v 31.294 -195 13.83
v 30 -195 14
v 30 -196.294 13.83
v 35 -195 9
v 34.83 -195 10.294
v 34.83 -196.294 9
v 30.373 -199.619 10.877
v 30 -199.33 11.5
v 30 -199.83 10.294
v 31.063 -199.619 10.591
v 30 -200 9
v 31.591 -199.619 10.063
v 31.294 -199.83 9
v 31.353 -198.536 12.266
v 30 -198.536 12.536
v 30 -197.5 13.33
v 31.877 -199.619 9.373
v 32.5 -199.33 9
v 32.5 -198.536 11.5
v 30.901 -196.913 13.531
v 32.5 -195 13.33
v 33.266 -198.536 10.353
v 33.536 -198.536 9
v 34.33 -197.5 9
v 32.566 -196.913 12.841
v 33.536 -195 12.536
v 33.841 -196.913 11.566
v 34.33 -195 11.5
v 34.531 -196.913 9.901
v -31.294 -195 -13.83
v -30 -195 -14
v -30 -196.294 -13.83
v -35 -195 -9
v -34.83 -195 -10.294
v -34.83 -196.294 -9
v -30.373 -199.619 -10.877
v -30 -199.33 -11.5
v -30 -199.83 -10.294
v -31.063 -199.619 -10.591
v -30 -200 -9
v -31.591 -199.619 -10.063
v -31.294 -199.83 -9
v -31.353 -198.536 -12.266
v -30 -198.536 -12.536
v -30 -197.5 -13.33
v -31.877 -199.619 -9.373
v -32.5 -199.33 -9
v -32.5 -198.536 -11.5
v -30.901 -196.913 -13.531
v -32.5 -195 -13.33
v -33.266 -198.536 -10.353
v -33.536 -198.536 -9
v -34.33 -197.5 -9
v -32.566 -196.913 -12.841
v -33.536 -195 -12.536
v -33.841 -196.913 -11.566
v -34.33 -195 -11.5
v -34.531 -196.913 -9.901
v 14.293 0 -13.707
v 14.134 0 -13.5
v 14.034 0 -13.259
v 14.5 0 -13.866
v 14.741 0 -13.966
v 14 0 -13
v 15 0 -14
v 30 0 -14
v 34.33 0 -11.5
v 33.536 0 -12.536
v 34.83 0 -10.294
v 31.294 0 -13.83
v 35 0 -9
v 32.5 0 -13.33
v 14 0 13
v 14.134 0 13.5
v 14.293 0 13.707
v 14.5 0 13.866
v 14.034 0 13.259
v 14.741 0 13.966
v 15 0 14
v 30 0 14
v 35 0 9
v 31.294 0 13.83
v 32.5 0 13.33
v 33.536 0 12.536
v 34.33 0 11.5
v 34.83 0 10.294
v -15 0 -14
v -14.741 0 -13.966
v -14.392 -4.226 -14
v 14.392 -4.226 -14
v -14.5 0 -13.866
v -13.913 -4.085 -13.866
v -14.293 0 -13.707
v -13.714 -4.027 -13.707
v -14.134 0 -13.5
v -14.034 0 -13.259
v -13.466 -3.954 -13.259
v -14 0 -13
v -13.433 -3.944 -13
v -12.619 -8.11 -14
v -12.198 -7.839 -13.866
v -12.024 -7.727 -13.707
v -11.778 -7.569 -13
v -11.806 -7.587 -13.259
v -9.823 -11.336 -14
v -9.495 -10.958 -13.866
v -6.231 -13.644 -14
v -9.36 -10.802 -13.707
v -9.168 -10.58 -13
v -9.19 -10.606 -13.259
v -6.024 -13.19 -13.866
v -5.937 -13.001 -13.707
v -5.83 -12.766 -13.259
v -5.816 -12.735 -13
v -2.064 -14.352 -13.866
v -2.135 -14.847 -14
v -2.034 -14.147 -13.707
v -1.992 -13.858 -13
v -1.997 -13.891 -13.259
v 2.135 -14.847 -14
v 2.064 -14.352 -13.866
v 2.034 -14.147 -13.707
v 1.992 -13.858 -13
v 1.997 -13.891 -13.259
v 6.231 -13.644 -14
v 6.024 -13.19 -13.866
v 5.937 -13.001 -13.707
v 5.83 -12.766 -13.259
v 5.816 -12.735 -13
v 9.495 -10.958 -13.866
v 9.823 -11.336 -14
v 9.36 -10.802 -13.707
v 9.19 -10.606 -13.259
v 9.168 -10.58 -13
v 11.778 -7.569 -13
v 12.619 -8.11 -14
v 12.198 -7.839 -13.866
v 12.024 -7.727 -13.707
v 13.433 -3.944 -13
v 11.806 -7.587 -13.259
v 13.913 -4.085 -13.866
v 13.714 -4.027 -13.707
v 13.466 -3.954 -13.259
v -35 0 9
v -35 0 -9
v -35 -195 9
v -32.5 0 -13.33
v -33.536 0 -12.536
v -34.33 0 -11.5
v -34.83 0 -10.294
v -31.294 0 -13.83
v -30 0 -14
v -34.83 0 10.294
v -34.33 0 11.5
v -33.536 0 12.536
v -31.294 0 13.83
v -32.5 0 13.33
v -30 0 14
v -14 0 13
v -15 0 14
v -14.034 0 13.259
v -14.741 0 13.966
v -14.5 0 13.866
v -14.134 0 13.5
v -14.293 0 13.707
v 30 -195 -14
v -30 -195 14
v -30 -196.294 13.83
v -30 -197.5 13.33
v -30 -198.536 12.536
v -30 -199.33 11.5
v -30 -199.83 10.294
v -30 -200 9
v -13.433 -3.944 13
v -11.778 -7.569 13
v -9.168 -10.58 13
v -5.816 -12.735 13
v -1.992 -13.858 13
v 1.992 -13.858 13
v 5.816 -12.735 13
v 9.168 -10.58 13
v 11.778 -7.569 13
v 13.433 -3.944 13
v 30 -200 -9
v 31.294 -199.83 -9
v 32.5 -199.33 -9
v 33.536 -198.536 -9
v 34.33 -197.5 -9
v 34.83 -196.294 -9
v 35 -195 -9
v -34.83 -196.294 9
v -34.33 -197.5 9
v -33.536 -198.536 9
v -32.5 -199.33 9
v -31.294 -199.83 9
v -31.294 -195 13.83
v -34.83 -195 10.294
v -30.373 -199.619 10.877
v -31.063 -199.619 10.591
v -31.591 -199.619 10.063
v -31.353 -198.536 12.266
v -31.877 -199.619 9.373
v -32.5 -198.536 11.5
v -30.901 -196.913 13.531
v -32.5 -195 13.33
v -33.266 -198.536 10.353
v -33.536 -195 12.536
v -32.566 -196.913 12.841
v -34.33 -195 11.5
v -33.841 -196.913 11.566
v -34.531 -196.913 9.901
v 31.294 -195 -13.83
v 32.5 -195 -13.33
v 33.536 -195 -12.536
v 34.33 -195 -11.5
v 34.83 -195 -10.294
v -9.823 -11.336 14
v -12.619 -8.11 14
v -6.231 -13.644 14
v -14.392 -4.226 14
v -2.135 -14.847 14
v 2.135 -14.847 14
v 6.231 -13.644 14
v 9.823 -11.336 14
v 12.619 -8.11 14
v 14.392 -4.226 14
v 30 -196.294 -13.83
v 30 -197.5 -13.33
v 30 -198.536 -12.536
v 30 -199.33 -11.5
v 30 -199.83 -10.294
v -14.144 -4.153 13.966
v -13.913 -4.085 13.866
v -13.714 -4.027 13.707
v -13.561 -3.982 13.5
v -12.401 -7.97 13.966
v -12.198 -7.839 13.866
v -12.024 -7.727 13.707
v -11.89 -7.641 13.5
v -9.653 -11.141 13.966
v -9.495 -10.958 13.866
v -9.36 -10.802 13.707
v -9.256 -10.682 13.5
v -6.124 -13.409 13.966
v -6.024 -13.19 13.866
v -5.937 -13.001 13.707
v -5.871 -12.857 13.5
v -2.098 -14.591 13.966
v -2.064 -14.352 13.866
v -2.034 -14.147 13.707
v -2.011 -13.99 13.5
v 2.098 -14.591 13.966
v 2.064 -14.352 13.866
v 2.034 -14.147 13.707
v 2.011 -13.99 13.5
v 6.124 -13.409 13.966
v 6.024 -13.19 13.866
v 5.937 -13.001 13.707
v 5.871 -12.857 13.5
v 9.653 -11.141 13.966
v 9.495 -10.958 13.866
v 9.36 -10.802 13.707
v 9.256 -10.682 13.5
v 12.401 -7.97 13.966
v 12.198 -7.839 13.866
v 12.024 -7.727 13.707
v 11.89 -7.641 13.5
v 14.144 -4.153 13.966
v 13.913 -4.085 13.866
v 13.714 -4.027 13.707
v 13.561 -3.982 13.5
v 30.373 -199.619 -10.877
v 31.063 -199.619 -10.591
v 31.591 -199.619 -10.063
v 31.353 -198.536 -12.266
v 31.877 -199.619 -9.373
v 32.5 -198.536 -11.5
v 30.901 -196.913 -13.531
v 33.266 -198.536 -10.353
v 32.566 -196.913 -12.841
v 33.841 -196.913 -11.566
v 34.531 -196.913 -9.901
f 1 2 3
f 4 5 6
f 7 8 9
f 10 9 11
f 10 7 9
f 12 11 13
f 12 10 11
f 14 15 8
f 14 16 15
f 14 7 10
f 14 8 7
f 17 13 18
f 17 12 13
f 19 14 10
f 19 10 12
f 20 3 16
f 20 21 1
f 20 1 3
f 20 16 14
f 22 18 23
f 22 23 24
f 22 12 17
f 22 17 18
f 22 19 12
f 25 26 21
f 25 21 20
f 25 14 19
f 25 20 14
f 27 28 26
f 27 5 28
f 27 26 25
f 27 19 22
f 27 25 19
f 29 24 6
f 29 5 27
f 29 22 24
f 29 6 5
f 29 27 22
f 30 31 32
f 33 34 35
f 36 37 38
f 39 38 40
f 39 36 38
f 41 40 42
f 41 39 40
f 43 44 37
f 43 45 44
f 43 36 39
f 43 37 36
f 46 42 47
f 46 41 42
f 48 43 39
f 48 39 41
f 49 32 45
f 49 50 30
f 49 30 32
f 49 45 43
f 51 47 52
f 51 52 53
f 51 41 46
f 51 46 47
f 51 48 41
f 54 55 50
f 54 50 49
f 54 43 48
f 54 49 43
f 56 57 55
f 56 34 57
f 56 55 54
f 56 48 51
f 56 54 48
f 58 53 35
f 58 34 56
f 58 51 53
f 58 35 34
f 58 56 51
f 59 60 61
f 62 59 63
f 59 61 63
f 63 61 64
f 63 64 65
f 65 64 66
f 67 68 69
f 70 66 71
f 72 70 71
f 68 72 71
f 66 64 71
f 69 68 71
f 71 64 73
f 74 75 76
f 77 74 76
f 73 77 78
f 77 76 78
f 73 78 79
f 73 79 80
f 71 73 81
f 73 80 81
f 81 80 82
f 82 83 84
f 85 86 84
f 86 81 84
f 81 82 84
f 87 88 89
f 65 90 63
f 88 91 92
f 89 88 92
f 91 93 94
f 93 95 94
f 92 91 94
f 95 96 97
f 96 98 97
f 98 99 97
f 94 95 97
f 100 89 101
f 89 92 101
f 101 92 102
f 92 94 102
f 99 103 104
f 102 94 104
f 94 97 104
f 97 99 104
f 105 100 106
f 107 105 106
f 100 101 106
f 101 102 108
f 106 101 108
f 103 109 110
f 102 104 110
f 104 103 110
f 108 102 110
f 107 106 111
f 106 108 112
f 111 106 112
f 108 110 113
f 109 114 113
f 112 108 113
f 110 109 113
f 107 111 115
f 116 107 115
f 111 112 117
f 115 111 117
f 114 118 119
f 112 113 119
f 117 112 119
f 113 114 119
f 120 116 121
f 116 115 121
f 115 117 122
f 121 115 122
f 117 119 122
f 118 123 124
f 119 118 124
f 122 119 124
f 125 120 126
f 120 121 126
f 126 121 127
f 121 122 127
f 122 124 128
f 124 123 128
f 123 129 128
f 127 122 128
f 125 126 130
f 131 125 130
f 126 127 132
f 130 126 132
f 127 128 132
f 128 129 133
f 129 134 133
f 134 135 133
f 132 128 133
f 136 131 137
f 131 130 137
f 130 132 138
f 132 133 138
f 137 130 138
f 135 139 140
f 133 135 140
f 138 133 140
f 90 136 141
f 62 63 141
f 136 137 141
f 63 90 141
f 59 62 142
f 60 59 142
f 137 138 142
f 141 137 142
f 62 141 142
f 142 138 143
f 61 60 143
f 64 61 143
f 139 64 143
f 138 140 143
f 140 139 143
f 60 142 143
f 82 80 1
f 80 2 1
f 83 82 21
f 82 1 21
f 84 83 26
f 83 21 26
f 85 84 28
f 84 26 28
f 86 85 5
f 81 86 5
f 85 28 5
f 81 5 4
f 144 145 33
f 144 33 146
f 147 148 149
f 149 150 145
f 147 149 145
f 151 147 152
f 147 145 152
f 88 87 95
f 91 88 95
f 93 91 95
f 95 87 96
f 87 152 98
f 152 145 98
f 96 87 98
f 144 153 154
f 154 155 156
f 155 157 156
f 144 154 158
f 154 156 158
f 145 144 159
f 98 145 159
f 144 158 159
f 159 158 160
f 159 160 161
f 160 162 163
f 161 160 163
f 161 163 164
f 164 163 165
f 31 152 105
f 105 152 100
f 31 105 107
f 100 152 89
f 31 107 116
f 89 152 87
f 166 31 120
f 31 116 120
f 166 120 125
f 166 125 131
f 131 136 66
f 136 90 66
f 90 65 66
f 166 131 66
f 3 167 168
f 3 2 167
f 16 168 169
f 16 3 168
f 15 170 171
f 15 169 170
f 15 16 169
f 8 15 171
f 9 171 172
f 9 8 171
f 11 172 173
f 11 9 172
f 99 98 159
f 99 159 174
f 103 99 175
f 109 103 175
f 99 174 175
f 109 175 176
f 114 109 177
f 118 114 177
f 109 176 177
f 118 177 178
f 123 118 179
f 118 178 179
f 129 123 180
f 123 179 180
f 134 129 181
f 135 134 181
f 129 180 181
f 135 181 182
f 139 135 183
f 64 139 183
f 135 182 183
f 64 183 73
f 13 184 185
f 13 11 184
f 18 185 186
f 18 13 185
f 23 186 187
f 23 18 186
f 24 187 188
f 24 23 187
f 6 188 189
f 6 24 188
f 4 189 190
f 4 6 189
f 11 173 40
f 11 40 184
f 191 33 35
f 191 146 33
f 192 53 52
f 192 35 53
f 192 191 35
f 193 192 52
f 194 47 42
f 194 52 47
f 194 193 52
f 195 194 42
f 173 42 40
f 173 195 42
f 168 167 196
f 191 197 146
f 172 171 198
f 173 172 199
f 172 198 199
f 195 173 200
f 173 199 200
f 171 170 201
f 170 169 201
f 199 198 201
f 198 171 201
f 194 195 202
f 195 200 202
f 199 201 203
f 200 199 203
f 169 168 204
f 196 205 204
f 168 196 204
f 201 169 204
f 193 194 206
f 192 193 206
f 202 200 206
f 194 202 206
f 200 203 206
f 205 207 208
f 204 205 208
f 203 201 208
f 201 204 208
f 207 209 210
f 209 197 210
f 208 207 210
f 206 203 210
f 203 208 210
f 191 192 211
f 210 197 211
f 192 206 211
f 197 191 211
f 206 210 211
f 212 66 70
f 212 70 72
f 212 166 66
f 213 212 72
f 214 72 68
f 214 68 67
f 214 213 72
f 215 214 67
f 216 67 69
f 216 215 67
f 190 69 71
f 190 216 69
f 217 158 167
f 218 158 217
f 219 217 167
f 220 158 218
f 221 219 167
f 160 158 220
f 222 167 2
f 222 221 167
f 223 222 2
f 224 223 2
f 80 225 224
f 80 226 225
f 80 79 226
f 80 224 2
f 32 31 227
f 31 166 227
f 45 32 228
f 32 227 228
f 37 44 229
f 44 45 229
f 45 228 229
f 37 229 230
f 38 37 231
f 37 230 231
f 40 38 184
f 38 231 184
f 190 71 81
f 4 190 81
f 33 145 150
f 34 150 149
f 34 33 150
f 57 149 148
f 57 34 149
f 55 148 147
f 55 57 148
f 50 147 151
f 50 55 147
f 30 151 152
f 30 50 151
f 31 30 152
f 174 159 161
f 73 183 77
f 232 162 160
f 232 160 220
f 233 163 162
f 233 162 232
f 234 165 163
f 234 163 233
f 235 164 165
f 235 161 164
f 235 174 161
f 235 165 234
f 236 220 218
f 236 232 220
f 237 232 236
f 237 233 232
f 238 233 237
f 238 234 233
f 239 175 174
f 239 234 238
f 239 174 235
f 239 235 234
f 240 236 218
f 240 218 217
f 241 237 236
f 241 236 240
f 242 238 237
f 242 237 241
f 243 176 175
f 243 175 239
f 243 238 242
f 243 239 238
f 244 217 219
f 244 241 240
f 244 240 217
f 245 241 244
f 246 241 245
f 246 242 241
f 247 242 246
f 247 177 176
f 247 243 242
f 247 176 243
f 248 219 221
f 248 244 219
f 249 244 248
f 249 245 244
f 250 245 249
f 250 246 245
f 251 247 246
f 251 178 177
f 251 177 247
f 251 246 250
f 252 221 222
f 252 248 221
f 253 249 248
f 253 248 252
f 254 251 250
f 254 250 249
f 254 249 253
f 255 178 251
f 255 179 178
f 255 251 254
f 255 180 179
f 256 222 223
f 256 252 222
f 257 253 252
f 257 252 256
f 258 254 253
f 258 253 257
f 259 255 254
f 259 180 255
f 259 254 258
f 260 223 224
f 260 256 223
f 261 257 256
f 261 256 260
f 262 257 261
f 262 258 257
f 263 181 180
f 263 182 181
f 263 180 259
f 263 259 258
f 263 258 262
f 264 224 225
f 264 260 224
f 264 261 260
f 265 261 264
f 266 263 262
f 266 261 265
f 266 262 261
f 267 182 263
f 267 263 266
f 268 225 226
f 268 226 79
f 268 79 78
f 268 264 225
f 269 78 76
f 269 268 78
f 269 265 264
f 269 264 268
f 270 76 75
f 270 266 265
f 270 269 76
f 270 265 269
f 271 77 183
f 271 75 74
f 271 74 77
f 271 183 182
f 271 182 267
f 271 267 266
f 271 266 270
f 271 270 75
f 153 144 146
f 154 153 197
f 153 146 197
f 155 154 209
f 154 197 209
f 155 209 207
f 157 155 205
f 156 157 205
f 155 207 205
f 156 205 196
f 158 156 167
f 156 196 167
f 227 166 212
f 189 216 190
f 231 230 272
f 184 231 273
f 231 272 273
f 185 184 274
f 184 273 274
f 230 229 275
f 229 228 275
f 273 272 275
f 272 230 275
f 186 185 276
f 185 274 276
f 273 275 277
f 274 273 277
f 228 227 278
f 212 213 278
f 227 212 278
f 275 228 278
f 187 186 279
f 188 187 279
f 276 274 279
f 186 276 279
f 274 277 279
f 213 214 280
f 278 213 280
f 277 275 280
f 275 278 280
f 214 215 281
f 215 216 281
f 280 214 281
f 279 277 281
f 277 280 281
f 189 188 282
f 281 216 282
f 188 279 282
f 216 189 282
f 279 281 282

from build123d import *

# Parameters (mm, degrees)
F0_W     = 70
F0_H     = 28
F1_DEPTH = 200
F2_R     = 14
F3_DEPTH = 28.001
F4_R     = 5
F5_R     = 1


with BuildPart() as f1:
    # F0 (on Front) → F1 (new body)
    with BuildSketch(Plane.XZ):
        Rectangle(F0_W, F0_H)
    extrude(amount=F1_DEPTH)

    # F2 (on face) → F3 (cut, through all)
    with BuildSketch(Plane.XY.offset(14)):
        Circle(F2_R)
    extrude(amount=-F3_DEPTH, mode=Mode.SUBTRACT)

    # F4
    f4_edges = [f1.edges().sort_by_distance(p)[0] for p in [
        (-35, -100, 14),
        (35, -100, 14),
        (35, -100, -14),
        (-35, -100, -14),
        (0, -200, 14),
        (0, -200, -14),
        (35, -200, 0),
        (-35, -200, 0),
    ]]
    fillet(f4_edges, radius=F4_R)

    # F5
    f5_edges = [f1.edges().sort_by_distance(p)[0] for p in [
        (0, -14, -14),
        (0, -14, 14),
    ]]
    fillet(f5_edges, radius=F5_R)


solid = f1.part
